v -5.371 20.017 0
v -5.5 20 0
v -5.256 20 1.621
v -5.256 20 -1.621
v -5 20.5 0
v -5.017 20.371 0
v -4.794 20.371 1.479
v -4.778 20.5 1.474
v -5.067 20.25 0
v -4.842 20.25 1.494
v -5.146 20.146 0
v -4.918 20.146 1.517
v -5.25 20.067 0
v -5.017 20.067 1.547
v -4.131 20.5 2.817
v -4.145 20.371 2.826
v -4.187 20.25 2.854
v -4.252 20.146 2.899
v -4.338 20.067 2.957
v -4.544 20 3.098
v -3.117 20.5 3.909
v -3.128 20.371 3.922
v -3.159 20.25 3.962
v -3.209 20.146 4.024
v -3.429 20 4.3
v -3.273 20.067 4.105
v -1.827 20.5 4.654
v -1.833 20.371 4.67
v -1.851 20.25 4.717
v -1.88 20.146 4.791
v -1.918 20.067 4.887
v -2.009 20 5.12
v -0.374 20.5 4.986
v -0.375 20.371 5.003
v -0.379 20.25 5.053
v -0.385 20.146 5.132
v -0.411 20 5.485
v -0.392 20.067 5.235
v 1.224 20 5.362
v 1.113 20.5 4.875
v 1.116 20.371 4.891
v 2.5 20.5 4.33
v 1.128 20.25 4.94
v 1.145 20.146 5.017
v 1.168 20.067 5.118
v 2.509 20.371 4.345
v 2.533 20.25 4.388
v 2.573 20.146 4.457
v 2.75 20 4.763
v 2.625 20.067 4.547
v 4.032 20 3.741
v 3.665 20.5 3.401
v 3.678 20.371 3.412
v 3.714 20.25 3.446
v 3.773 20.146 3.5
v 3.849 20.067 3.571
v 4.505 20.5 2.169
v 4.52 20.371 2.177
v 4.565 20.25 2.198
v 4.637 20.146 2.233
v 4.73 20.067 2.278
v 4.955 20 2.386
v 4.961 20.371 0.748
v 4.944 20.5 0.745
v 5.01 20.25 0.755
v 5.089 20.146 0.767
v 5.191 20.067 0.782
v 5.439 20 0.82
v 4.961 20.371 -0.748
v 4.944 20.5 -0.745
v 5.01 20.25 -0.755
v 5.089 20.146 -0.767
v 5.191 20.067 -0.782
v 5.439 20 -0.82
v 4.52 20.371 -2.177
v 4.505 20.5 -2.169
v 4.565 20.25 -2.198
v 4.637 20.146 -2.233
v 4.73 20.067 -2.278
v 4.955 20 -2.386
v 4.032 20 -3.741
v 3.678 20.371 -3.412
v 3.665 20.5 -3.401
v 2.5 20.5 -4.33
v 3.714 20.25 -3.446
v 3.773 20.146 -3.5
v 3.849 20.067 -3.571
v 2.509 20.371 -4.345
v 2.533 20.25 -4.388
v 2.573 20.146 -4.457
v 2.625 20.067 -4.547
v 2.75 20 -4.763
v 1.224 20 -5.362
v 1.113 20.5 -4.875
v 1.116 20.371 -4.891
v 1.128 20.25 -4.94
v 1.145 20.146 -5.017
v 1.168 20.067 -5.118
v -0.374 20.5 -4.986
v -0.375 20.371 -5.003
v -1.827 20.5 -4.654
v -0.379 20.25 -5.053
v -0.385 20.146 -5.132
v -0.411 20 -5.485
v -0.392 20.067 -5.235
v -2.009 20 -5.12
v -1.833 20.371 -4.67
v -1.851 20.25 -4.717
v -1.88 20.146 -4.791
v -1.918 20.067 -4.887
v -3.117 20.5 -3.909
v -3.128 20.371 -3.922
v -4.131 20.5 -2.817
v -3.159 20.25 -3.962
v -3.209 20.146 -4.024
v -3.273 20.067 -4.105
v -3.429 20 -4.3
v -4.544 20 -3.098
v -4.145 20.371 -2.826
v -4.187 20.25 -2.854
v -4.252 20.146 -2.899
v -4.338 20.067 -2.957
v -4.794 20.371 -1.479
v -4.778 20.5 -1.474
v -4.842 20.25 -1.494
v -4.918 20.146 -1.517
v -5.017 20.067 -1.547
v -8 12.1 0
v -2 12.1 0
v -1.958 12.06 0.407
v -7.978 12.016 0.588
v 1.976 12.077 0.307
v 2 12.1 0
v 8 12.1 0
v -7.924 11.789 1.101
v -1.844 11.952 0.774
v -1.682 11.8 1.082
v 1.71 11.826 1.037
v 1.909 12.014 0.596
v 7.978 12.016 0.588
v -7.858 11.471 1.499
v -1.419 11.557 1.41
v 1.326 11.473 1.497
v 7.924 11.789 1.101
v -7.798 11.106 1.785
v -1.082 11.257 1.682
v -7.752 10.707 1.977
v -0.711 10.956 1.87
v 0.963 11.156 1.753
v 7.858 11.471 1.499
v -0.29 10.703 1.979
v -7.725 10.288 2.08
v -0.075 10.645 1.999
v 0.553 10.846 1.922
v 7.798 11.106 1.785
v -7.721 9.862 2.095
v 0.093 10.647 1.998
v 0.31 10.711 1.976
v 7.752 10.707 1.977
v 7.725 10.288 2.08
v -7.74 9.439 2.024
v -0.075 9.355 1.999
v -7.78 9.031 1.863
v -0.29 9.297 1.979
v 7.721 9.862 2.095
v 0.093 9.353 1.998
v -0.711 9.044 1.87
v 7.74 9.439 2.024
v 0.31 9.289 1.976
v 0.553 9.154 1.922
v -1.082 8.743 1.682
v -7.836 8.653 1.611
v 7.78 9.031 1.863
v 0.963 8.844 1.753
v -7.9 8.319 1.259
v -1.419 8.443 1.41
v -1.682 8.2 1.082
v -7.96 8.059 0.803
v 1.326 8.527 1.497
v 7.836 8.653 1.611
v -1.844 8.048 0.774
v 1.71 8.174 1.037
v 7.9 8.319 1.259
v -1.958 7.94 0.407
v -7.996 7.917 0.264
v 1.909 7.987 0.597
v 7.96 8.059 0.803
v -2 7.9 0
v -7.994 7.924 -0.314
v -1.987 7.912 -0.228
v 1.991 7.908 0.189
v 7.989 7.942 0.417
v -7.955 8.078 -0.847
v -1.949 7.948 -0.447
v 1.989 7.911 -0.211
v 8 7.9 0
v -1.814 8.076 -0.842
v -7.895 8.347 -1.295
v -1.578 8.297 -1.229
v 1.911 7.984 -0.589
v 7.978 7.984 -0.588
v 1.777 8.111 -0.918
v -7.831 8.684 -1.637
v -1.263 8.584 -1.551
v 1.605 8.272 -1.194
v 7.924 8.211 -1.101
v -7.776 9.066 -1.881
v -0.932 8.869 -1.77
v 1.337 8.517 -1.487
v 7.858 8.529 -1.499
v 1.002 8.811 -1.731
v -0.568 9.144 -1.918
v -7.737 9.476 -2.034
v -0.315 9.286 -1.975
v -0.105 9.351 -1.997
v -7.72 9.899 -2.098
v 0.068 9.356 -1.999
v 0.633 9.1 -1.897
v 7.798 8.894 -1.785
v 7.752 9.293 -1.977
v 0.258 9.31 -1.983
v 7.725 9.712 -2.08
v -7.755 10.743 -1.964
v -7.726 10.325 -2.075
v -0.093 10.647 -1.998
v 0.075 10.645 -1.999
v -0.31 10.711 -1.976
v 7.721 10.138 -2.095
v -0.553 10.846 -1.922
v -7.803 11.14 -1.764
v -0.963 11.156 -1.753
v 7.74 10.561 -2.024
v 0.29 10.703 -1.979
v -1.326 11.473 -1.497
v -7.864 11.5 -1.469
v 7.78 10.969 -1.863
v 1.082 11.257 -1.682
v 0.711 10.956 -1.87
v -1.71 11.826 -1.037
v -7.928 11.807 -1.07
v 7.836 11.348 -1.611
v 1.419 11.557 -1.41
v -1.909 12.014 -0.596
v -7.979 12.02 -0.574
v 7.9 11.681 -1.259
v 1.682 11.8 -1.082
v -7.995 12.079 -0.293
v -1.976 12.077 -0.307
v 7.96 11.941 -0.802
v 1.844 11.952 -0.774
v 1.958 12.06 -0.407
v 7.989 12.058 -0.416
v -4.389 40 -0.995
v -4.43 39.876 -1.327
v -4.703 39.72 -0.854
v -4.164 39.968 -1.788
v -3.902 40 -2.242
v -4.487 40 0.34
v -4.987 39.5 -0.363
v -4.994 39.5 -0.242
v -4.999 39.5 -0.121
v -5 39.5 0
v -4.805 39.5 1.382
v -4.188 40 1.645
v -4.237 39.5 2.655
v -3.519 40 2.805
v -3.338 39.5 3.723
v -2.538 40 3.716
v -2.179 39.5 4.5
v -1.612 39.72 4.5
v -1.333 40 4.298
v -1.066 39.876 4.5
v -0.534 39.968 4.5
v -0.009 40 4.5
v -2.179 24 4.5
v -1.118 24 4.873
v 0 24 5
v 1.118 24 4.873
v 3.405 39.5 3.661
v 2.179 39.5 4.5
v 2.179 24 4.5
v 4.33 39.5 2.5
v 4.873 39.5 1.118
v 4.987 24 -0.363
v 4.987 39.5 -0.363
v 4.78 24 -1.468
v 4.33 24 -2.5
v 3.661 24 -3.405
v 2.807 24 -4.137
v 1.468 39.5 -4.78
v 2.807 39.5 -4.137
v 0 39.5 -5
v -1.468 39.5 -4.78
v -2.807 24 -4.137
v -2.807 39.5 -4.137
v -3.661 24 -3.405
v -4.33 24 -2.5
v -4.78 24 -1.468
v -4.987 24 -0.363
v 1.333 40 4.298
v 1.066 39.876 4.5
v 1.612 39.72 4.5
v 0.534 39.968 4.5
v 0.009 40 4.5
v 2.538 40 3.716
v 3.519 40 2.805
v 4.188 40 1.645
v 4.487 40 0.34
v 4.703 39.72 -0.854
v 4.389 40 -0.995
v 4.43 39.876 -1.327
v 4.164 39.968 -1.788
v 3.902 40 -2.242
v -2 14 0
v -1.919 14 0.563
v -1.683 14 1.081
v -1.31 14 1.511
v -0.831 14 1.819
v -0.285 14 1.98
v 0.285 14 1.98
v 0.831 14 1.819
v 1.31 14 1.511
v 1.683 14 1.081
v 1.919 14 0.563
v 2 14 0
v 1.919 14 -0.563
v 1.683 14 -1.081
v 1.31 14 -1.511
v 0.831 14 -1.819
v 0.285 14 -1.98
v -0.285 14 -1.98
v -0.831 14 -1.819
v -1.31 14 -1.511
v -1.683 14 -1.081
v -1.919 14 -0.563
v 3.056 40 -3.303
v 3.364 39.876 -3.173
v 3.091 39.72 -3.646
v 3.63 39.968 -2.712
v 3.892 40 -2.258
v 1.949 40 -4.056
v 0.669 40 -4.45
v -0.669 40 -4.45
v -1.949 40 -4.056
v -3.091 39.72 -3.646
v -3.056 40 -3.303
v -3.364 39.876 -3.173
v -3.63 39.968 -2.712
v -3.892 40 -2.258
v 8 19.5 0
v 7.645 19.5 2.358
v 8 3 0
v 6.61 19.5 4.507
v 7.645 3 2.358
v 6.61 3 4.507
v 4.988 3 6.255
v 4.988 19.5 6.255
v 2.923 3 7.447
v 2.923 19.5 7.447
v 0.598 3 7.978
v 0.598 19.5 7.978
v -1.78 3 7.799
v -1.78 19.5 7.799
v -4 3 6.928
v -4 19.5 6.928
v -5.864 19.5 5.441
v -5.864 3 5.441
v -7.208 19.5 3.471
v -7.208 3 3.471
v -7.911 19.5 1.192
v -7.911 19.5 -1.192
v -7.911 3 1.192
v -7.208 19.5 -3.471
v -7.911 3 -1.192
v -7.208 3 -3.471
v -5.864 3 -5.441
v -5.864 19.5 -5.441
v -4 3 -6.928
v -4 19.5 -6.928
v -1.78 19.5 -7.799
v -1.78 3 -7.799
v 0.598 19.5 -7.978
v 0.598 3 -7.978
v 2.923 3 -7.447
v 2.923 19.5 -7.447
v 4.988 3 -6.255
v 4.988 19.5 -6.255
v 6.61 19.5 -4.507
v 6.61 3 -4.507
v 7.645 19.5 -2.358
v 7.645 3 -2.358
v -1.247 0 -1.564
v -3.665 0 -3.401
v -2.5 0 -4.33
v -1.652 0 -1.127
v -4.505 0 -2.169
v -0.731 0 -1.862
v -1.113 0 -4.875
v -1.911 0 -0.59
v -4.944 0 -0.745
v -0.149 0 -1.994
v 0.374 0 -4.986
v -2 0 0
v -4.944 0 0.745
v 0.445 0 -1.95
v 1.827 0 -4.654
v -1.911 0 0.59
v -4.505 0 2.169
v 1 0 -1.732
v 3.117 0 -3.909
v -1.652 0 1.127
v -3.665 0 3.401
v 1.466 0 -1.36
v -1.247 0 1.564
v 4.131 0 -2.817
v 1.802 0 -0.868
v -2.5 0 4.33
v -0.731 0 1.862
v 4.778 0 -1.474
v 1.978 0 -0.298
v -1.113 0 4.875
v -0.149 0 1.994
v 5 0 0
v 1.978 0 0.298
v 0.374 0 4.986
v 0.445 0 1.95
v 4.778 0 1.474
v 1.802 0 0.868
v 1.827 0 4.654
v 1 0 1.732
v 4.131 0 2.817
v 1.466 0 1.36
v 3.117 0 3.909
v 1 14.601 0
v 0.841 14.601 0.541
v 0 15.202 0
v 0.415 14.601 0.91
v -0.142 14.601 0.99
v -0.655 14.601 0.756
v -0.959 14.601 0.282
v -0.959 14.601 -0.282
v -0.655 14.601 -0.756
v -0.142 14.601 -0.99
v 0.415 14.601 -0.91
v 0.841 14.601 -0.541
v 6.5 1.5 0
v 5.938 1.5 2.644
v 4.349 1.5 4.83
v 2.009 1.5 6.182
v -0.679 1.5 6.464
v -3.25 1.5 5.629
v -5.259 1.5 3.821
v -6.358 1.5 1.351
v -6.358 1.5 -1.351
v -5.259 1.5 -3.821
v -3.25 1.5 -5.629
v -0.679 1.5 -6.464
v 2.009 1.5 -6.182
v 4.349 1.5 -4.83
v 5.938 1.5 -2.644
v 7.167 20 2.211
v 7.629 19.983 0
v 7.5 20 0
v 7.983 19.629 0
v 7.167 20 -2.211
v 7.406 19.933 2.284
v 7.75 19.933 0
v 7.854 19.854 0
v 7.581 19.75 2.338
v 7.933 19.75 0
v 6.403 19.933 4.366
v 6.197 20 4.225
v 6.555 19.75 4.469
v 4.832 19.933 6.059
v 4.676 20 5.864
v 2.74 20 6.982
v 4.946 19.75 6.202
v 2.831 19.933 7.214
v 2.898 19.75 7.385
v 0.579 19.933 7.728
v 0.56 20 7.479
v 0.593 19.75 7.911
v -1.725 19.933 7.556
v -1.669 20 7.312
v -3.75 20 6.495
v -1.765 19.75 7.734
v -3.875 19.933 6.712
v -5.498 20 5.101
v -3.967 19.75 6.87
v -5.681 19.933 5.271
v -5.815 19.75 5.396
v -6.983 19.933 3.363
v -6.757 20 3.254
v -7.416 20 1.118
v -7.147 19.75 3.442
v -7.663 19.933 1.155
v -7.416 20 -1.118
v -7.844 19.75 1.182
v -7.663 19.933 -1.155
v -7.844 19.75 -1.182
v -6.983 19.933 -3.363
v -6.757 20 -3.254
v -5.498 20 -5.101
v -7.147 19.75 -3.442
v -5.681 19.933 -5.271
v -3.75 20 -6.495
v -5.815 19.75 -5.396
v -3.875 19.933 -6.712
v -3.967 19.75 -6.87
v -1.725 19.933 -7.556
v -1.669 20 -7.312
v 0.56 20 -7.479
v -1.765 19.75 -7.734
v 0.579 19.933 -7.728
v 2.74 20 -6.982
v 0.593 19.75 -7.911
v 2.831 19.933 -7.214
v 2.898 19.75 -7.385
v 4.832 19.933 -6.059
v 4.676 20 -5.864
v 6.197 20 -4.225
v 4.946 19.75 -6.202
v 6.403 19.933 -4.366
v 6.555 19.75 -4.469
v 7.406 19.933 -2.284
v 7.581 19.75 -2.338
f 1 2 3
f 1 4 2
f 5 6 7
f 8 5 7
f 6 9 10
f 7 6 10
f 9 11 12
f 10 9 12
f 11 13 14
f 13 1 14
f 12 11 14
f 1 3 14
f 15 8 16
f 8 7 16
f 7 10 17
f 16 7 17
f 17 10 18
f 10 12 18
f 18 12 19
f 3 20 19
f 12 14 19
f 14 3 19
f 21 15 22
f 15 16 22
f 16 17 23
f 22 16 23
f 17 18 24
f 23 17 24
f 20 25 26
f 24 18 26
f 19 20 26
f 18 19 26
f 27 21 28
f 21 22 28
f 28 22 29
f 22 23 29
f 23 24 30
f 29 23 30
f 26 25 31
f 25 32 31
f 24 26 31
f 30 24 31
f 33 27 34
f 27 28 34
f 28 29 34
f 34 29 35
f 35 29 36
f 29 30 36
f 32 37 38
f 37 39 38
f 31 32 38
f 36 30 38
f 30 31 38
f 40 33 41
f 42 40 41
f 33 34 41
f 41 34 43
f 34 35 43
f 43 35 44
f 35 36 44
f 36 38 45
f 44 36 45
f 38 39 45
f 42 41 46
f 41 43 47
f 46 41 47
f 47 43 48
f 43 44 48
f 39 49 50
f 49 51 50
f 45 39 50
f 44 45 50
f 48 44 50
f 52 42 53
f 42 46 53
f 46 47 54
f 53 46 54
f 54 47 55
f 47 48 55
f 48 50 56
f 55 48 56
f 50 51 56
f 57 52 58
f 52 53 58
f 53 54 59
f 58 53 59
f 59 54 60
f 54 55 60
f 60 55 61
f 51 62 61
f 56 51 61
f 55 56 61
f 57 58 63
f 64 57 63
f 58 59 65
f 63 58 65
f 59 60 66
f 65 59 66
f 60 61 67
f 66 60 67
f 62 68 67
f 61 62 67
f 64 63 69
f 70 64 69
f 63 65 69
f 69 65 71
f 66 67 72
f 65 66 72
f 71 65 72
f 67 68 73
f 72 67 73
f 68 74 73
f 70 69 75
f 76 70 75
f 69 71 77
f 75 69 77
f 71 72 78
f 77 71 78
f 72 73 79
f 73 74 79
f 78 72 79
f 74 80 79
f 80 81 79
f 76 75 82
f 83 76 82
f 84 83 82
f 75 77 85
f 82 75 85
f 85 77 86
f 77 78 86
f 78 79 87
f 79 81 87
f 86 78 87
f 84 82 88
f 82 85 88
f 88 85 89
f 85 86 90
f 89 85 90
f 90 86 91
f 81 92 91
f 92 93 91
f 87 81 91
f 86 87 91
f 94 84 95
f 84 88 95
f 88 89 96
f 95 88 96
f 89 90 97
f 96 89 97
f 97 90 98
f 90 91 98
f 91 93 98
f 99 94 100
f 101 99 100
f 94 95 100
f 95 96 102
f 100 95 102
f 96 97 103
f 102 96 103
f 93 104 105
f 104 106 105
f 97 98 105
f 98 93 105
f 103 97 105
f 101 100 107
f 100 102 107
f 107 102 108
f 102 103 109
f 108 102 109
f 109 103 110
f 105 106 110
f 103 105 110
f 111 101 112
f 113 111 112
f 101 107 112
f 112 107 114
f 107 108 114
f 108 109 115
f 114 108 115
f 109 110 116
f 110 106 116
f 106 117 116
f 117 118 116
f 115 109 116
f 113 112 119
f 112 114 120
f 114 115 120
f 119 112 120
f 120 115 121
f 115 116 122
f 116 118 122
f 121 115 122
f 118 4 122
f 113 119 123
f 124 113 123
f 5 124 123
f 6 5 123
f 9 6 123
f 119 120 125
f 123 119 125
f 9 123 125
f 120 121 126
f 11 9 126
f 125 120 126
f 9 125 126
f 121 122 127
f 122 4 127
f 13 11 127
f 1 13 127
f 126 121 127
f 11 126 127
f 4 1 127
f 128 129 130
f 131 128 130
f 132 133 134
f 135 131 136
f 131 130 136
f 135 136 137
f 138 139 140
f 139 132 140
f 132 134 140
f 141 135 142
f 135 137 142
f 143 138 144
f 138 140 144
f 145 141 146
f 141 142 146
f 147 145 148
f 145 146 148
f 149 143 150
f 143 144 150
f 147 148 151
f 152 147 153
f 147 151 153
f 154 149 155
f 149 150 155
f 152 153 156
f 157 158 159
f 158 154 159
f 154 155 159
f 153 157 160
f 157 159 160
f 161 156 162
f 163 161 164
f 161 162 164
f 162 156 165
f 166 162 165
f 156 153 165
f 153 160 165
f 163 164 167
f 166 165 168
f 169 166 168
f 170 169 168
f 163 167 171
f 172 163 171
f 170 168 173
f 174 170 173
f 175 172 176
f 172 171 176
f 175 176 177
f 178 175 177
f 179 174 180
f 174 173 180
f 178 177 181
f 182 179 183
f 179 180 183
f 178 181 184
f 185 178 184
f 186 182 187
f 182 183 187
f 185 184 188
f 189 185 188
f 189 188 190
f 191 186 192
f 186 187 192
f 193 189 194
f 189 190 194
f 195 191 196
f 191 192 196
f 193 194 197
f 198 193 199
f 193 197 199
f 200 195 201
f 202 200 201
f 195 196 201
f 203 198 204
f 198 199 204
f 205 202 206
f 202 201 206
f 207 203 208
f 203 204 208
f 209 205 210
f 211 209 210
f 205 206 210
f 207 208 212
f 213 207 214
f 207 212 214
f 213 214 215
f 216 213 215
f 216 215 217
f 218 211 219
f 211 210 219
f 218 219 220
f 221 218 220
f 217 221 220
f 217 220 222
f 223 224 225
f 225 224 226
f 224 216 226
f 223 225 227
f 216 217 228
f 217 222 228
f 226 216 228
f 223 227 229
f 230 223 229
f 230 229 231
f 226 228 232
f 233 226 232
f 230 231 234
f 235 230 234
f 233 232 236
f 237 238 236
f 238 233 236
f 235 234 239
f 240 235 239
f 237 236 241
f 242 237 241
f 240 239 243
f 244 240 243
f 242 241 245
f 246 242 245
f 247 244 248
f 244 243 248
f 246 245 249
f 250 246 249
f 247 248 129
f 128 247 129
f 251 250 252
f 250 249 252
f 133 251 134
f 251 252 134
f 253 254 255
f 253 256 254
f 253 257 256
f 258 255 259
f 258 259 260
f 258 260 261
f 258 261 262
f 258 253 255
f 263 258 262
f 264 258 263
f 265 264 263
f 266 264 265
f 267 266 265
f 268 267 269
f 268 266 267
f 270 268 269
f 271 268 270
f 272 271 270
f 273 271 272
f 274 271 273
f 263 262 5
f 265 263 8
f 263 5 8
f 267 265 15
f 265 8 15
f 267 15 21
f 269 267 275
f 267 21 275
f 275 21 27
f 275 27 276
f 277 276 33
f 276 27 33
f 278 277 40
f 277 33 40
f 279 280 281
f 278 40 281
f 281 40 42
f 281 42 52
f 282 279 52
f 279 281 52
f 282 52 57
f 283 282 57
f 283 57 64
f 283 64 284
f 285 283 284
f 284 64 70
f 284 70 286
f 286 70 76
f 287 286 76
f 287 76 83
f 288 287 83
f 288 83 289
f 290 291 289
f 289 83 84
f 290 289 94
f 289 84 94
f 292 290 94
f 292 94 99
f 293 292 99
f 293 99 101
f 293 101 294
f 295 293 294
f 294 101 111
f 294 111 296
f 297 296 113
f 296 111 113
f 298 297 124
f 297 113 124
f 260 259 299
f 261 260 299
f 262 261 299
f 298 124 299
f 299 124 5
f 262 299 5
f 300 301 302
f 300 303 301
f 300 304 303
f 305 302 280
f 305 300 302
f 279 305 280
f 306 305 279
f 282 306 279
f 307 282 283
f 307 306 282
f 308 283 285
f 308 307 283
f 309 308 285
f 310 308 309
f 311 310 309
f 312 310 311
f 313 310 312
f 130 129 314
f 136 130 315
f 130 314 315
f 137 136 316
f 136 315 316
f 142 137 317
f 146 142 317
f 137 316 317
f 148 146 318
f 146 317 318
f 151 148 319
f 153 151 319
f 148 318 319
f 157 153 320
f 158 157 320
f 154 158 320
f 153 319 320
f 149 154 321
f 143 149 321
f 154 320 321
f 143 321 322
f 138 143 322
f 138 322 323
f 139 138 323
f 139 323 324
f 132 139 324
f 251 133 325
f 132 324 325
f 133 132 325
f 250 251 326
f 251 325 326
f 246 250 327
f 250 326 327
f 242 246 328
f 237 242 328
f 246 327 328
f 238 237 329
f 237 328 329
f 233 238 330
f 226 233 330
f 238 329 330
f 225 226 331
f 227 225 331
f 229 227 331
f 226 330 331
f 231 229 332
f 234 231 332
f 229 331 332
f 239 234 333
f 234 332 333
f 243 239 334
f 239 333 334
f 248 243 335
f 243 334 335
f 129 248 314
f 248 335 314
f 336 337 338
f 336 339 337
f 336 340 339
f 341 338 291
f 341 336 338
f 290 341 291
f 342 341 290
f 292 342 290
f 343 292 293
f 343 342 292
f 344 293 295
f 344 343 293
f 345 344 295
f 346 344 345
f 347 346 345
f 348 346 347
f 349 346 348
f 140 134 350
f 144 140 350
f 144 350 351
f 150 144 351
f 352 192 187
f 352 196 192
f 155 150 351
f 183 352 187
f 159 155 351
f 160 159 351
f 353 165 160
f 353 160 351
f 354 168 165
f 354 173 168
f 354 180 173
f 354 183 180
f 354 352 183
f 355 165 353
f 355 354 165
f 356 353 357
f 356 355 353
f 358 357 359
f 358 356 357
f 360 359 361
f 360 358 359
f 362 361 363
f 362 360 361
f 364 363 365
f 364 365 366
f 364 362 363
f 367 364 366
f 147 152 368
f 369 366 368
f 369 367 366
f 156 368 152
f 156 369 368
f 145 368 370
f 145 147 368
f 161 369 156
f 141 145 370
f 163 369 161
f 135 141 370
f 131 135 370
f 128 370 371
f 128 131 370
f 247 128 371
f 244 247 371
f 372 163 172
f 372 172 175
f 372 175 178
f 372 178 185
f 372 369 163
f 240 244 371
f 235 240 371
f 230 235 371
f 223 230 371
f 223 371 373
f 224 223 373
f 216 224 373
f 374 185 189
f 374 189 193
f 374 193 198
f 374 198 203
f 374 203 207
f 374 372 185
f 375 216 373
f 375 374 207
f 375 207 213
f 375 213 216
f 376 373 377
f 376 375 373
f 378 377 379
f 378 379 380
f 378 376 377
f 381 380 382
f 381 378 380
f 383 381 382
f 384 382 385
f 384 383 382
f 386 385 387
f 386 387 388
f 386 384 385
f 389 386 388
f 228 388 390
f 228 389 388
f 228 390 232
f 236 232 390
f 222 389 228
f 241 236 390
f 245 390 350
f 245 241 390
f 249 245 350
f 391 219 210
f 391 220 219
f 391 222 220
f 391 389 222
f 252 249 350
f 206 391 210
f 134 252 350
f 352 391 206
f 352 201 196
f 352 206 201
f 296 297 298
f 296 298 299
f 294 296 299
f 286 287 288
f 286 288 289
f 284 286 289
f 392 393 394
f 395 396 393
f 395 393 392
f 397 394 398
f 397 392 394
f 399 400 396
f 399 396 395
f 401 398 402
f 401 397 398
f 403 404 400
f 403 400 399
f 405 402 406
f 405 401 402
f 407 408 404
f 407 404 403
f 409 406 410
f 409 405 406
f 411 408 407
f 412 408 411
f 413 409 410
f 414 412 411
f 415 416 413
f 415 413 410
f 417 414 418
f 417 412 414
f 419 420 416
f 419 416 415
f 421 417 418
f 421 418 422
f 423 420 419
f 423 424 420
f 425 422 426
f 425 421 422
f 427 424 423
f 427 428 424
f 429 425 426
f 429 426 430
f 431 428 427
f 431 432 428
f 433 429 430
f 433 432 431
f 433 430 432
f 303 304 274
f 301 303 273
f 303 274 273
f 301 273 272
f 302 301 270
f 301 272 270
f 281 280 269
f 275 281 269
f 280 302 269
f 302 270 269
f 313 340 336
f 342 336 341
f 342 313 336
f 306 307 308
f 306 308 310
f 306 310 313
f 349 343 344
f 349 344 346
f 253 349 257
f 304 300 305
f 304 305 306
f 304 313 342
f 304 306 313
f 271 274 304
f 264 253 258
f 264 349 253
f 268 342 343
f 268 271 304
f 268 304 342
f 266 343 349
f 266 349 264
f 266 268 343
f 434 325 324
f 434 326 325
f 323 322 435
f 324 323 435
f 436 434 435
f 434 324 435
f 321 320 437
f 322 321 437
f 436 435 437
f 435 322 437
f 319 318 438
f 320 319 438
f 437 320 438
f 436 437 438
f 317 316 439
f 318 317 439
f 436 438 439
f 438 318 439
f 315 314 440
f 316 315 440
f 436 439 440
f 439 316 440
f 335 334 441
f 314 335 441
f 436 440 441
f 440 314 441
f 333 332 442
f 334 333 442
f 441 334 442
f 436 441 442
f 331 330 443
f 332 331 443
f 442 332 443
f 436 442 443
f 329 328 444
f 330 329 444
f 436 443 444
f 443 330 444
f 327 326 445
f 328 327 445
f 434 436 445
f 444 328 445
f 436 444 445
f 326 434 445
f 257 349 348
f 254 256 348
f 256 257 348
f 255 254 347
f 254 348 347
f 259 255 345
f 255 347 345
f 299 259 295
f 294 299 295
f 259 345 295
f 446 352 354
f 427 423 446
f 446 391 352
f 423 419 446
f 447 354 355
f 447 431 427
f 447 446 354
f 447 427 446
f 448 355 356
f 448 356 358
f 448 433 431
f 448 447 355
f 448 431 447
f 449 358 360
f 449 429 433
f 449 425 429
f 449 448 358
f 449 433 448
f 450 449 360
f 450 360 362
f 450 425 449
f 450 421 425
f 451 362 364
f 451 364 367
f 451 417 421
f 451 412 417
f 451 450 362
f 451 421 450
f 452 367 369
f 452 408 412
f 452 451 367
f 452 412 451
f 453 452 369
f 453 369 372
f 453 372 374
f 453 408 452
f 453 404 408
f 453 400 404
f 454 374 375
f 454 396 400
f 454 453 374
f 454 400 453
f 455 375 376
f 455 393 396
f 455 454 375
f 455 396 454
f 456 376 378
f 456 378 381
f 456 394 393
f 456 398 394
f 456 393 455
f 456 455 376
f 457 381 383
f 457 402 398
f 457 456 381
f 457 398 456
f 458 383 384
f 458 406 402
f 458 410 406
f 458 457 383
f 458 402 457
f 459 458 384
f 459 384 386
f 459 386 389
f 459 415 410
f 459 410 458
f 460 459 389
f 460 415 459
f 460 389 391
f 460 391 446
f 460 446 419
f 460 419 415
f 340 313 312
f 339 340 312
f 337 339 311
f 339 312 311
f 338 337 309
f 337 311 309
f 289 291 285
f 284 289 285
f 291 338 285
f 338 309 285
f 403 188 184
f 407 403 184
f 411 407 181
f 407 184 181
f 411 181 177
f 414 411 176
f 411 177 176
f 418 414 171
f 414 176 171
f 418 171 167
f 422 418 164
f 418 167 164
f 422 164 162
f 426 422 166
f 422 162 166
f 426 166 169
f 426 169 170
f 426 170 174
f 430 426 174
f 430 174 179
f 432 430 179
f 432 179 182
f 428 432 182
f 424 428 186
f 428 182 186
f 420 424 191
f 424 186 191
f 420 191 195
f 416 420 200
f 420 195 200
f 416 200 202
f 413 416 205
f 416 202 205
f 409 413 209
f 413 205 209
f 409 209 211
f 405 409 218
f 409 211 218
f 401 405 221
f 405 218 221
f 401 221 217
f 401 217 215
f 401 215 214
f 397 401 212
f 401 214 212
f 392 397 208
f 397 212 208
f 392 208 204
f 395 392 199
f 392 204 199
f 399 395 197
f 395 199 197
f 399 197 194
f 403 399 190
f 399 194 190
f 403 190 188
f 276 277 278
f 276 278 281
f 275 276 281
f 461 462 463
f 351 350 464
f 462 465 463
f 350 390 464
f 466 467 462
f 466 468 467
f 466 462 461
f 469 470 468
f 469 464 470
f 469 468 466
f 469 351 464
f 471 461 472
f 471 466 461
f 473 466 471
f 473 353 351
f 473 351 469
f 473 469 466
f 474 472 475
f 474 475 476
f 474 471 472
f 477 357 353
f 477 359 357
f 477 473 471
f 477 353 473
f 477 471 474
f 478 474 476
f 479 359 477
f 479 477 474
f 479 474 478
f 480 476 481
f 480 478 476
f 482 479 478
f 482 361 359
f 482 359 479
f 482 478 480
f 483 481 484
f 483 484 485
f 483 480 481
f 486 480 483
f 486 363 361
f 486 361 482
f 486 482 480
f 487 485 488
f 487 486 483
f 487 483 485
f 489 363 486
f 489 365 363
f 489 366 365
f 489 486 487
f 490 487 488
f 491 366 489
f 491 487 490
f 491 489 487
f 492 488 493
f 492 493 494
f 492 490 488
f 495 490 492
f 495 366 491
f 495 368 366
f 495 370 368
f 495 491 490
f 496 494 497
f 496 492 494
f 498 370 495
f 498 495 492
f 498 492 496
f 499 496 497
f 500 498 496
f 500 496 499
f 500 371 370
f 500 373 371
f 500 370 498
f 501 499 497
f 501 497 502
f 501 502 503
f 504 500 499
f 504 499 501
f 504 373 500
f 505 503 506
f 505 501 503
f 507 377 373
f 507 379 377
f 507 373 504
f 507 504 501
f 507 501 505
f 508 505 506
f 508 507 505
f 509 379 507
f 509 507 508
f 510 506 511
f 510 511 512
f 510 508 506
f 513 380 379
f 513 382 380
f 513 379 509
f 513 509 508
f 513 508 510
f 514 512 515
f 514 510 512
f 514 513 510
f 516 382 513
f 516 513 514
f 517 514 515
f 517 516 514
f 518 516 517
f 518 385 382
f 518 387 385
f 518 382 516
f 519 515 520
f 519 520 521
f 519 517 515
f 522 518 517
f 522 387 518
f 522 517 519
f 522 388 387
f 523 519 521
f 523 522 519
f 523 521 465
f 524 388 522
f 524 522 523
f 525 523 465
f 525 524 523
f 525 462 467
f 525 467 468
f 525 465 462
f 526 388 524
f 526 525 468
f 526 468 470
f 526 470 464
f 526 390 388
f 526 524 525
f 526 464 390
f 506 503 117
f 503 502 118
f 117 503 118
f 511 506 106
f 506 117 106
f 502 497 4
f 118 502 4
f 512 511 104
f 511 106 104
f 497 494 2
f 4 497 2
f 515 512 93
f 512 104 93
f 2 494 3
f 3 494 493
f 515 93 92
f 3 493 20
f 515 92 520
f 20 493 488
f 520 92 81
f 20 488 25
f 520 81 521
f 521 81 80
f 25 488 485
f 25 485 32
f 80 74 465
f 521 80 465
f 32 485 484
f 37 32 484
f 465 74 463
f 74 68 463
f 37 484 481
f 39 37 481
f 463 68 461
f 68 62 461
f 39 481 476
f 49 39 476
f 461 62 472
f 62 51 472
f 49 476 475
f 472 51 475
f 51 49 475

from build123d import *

# Parameters (mm, degrees)
F0_R            = 8
F1_DEPTH        = 20
F2_R            = 5
F3_DEPTH        = 20
F5_DEPTH        = 16
F5_COPIES_COUNT = 3
F6_SIZE         = 0.49999
F7_R            = 0.5
F9_D            = 4
F9_DEPTH        = 14
F9_TIP          = 1.2017212381
F10_R           = 2.1
F11_DEPTH       = 8.25
F12_SIZE        = 3


# Not quite as in the source:
# - a fillet or chamfer is up to 0.001 mm smaller than in the source, because OpenCascade refuses the exact size
# - a pattern or mirror of a feature is missing from the dataset's text; its kind, count and spacing are read off the source's solid


with BuildPart() as f1:
    # F0 (on Front) → F1 (new body)
    with BuildSketch(Plane.XZ):
        Circle(F0_R)
    extrude(amount=-F1_DEPTH)

    # F2 (on face) → F3 (join)
    with BuildSketch(Plane(origin=(0, 20, 0), x_dir=(-1, 0, 0), z_dir=(0, 1, 0))):
        Circle(F2_R)
    extrude(amount=F3_DEPTH)

    # F4 (on face) → F5 (cut)
    with BuildSketch(Plane(origin=(0, 40, 0), x_dir=(-1, 0, 0), z_dir=(0, 1, 0))):
        with BuildLine():
            ThreePointArc((2.1794494718, 4.5), (0, 5), (-2.1794494718, 4.5))
            Line((-2.1794494718, 4.5), (2.1794494718, 4.5))
        make_face()
    f5 = extrude(amount=-F5_DEPTH, mode=Mode.SUBTRACT)

    # F5_copies: F5 ×3 about axis
    f5_copies_axis = Axis((0, 0, 0), (0, 1, 0))
    for i in range(1, F5_COPIES_COUNT):
        add(f5.rotate(f5_copies_axis, i * 360 / F5_COPIES_COUNT), mode=Mode.SUBTRACT)

    # F6 (size 0.5 in the source; OpenCascade refuses exactly that, so slightly less here)
    f6_edges = [f1.edges().sort_by_distance(p)[0] for p in [
        (4.330127, 40, 2.5),
        (-4.996709, 40, -0.18139),
        (0, 40, -5),
        (-4.236582, 40, 2.655443),
    ]]
    chamfer(f6_edges, length=F6_SIZE)

    # F7
    f7_edges = [f1.edges().sort_by_distance(p)[0] for p in [
        (-8, 20, 0),
        (5, 20, 0),
    ]]
    fillet(f7_edges, radius=F7_R)

    # F9
    with Locations(Plane.XZ):
        with Locations((0, 0)):
            Hole(F9_D / 2, depth=F9_DEPTH)
            with Locations((0, 0, -(F9_DEPTH + F9_TIP / 2))):  # 118° drill point
                Cone(0, F9_D / 2, F9_TIP, mode=Mode.SUBTRACT)

    # F10 (on Right) → F11 (cut, symmetric)
    with BuildSketch(Plane.YZ):
        with Locations((10, 0)):
            Circle(F10_R)
    extrude(amount=F11_DEPTH, both=True, mode=Mode.SUBTRACT)

    # F12
    f12_edges = [f1.edges().sort_by_distance(p)[0] for p in [
        (-8, 0, 0),
    ]]
    chamfer(f12_edges, length=F12_SIZE)


solid = f1.part
